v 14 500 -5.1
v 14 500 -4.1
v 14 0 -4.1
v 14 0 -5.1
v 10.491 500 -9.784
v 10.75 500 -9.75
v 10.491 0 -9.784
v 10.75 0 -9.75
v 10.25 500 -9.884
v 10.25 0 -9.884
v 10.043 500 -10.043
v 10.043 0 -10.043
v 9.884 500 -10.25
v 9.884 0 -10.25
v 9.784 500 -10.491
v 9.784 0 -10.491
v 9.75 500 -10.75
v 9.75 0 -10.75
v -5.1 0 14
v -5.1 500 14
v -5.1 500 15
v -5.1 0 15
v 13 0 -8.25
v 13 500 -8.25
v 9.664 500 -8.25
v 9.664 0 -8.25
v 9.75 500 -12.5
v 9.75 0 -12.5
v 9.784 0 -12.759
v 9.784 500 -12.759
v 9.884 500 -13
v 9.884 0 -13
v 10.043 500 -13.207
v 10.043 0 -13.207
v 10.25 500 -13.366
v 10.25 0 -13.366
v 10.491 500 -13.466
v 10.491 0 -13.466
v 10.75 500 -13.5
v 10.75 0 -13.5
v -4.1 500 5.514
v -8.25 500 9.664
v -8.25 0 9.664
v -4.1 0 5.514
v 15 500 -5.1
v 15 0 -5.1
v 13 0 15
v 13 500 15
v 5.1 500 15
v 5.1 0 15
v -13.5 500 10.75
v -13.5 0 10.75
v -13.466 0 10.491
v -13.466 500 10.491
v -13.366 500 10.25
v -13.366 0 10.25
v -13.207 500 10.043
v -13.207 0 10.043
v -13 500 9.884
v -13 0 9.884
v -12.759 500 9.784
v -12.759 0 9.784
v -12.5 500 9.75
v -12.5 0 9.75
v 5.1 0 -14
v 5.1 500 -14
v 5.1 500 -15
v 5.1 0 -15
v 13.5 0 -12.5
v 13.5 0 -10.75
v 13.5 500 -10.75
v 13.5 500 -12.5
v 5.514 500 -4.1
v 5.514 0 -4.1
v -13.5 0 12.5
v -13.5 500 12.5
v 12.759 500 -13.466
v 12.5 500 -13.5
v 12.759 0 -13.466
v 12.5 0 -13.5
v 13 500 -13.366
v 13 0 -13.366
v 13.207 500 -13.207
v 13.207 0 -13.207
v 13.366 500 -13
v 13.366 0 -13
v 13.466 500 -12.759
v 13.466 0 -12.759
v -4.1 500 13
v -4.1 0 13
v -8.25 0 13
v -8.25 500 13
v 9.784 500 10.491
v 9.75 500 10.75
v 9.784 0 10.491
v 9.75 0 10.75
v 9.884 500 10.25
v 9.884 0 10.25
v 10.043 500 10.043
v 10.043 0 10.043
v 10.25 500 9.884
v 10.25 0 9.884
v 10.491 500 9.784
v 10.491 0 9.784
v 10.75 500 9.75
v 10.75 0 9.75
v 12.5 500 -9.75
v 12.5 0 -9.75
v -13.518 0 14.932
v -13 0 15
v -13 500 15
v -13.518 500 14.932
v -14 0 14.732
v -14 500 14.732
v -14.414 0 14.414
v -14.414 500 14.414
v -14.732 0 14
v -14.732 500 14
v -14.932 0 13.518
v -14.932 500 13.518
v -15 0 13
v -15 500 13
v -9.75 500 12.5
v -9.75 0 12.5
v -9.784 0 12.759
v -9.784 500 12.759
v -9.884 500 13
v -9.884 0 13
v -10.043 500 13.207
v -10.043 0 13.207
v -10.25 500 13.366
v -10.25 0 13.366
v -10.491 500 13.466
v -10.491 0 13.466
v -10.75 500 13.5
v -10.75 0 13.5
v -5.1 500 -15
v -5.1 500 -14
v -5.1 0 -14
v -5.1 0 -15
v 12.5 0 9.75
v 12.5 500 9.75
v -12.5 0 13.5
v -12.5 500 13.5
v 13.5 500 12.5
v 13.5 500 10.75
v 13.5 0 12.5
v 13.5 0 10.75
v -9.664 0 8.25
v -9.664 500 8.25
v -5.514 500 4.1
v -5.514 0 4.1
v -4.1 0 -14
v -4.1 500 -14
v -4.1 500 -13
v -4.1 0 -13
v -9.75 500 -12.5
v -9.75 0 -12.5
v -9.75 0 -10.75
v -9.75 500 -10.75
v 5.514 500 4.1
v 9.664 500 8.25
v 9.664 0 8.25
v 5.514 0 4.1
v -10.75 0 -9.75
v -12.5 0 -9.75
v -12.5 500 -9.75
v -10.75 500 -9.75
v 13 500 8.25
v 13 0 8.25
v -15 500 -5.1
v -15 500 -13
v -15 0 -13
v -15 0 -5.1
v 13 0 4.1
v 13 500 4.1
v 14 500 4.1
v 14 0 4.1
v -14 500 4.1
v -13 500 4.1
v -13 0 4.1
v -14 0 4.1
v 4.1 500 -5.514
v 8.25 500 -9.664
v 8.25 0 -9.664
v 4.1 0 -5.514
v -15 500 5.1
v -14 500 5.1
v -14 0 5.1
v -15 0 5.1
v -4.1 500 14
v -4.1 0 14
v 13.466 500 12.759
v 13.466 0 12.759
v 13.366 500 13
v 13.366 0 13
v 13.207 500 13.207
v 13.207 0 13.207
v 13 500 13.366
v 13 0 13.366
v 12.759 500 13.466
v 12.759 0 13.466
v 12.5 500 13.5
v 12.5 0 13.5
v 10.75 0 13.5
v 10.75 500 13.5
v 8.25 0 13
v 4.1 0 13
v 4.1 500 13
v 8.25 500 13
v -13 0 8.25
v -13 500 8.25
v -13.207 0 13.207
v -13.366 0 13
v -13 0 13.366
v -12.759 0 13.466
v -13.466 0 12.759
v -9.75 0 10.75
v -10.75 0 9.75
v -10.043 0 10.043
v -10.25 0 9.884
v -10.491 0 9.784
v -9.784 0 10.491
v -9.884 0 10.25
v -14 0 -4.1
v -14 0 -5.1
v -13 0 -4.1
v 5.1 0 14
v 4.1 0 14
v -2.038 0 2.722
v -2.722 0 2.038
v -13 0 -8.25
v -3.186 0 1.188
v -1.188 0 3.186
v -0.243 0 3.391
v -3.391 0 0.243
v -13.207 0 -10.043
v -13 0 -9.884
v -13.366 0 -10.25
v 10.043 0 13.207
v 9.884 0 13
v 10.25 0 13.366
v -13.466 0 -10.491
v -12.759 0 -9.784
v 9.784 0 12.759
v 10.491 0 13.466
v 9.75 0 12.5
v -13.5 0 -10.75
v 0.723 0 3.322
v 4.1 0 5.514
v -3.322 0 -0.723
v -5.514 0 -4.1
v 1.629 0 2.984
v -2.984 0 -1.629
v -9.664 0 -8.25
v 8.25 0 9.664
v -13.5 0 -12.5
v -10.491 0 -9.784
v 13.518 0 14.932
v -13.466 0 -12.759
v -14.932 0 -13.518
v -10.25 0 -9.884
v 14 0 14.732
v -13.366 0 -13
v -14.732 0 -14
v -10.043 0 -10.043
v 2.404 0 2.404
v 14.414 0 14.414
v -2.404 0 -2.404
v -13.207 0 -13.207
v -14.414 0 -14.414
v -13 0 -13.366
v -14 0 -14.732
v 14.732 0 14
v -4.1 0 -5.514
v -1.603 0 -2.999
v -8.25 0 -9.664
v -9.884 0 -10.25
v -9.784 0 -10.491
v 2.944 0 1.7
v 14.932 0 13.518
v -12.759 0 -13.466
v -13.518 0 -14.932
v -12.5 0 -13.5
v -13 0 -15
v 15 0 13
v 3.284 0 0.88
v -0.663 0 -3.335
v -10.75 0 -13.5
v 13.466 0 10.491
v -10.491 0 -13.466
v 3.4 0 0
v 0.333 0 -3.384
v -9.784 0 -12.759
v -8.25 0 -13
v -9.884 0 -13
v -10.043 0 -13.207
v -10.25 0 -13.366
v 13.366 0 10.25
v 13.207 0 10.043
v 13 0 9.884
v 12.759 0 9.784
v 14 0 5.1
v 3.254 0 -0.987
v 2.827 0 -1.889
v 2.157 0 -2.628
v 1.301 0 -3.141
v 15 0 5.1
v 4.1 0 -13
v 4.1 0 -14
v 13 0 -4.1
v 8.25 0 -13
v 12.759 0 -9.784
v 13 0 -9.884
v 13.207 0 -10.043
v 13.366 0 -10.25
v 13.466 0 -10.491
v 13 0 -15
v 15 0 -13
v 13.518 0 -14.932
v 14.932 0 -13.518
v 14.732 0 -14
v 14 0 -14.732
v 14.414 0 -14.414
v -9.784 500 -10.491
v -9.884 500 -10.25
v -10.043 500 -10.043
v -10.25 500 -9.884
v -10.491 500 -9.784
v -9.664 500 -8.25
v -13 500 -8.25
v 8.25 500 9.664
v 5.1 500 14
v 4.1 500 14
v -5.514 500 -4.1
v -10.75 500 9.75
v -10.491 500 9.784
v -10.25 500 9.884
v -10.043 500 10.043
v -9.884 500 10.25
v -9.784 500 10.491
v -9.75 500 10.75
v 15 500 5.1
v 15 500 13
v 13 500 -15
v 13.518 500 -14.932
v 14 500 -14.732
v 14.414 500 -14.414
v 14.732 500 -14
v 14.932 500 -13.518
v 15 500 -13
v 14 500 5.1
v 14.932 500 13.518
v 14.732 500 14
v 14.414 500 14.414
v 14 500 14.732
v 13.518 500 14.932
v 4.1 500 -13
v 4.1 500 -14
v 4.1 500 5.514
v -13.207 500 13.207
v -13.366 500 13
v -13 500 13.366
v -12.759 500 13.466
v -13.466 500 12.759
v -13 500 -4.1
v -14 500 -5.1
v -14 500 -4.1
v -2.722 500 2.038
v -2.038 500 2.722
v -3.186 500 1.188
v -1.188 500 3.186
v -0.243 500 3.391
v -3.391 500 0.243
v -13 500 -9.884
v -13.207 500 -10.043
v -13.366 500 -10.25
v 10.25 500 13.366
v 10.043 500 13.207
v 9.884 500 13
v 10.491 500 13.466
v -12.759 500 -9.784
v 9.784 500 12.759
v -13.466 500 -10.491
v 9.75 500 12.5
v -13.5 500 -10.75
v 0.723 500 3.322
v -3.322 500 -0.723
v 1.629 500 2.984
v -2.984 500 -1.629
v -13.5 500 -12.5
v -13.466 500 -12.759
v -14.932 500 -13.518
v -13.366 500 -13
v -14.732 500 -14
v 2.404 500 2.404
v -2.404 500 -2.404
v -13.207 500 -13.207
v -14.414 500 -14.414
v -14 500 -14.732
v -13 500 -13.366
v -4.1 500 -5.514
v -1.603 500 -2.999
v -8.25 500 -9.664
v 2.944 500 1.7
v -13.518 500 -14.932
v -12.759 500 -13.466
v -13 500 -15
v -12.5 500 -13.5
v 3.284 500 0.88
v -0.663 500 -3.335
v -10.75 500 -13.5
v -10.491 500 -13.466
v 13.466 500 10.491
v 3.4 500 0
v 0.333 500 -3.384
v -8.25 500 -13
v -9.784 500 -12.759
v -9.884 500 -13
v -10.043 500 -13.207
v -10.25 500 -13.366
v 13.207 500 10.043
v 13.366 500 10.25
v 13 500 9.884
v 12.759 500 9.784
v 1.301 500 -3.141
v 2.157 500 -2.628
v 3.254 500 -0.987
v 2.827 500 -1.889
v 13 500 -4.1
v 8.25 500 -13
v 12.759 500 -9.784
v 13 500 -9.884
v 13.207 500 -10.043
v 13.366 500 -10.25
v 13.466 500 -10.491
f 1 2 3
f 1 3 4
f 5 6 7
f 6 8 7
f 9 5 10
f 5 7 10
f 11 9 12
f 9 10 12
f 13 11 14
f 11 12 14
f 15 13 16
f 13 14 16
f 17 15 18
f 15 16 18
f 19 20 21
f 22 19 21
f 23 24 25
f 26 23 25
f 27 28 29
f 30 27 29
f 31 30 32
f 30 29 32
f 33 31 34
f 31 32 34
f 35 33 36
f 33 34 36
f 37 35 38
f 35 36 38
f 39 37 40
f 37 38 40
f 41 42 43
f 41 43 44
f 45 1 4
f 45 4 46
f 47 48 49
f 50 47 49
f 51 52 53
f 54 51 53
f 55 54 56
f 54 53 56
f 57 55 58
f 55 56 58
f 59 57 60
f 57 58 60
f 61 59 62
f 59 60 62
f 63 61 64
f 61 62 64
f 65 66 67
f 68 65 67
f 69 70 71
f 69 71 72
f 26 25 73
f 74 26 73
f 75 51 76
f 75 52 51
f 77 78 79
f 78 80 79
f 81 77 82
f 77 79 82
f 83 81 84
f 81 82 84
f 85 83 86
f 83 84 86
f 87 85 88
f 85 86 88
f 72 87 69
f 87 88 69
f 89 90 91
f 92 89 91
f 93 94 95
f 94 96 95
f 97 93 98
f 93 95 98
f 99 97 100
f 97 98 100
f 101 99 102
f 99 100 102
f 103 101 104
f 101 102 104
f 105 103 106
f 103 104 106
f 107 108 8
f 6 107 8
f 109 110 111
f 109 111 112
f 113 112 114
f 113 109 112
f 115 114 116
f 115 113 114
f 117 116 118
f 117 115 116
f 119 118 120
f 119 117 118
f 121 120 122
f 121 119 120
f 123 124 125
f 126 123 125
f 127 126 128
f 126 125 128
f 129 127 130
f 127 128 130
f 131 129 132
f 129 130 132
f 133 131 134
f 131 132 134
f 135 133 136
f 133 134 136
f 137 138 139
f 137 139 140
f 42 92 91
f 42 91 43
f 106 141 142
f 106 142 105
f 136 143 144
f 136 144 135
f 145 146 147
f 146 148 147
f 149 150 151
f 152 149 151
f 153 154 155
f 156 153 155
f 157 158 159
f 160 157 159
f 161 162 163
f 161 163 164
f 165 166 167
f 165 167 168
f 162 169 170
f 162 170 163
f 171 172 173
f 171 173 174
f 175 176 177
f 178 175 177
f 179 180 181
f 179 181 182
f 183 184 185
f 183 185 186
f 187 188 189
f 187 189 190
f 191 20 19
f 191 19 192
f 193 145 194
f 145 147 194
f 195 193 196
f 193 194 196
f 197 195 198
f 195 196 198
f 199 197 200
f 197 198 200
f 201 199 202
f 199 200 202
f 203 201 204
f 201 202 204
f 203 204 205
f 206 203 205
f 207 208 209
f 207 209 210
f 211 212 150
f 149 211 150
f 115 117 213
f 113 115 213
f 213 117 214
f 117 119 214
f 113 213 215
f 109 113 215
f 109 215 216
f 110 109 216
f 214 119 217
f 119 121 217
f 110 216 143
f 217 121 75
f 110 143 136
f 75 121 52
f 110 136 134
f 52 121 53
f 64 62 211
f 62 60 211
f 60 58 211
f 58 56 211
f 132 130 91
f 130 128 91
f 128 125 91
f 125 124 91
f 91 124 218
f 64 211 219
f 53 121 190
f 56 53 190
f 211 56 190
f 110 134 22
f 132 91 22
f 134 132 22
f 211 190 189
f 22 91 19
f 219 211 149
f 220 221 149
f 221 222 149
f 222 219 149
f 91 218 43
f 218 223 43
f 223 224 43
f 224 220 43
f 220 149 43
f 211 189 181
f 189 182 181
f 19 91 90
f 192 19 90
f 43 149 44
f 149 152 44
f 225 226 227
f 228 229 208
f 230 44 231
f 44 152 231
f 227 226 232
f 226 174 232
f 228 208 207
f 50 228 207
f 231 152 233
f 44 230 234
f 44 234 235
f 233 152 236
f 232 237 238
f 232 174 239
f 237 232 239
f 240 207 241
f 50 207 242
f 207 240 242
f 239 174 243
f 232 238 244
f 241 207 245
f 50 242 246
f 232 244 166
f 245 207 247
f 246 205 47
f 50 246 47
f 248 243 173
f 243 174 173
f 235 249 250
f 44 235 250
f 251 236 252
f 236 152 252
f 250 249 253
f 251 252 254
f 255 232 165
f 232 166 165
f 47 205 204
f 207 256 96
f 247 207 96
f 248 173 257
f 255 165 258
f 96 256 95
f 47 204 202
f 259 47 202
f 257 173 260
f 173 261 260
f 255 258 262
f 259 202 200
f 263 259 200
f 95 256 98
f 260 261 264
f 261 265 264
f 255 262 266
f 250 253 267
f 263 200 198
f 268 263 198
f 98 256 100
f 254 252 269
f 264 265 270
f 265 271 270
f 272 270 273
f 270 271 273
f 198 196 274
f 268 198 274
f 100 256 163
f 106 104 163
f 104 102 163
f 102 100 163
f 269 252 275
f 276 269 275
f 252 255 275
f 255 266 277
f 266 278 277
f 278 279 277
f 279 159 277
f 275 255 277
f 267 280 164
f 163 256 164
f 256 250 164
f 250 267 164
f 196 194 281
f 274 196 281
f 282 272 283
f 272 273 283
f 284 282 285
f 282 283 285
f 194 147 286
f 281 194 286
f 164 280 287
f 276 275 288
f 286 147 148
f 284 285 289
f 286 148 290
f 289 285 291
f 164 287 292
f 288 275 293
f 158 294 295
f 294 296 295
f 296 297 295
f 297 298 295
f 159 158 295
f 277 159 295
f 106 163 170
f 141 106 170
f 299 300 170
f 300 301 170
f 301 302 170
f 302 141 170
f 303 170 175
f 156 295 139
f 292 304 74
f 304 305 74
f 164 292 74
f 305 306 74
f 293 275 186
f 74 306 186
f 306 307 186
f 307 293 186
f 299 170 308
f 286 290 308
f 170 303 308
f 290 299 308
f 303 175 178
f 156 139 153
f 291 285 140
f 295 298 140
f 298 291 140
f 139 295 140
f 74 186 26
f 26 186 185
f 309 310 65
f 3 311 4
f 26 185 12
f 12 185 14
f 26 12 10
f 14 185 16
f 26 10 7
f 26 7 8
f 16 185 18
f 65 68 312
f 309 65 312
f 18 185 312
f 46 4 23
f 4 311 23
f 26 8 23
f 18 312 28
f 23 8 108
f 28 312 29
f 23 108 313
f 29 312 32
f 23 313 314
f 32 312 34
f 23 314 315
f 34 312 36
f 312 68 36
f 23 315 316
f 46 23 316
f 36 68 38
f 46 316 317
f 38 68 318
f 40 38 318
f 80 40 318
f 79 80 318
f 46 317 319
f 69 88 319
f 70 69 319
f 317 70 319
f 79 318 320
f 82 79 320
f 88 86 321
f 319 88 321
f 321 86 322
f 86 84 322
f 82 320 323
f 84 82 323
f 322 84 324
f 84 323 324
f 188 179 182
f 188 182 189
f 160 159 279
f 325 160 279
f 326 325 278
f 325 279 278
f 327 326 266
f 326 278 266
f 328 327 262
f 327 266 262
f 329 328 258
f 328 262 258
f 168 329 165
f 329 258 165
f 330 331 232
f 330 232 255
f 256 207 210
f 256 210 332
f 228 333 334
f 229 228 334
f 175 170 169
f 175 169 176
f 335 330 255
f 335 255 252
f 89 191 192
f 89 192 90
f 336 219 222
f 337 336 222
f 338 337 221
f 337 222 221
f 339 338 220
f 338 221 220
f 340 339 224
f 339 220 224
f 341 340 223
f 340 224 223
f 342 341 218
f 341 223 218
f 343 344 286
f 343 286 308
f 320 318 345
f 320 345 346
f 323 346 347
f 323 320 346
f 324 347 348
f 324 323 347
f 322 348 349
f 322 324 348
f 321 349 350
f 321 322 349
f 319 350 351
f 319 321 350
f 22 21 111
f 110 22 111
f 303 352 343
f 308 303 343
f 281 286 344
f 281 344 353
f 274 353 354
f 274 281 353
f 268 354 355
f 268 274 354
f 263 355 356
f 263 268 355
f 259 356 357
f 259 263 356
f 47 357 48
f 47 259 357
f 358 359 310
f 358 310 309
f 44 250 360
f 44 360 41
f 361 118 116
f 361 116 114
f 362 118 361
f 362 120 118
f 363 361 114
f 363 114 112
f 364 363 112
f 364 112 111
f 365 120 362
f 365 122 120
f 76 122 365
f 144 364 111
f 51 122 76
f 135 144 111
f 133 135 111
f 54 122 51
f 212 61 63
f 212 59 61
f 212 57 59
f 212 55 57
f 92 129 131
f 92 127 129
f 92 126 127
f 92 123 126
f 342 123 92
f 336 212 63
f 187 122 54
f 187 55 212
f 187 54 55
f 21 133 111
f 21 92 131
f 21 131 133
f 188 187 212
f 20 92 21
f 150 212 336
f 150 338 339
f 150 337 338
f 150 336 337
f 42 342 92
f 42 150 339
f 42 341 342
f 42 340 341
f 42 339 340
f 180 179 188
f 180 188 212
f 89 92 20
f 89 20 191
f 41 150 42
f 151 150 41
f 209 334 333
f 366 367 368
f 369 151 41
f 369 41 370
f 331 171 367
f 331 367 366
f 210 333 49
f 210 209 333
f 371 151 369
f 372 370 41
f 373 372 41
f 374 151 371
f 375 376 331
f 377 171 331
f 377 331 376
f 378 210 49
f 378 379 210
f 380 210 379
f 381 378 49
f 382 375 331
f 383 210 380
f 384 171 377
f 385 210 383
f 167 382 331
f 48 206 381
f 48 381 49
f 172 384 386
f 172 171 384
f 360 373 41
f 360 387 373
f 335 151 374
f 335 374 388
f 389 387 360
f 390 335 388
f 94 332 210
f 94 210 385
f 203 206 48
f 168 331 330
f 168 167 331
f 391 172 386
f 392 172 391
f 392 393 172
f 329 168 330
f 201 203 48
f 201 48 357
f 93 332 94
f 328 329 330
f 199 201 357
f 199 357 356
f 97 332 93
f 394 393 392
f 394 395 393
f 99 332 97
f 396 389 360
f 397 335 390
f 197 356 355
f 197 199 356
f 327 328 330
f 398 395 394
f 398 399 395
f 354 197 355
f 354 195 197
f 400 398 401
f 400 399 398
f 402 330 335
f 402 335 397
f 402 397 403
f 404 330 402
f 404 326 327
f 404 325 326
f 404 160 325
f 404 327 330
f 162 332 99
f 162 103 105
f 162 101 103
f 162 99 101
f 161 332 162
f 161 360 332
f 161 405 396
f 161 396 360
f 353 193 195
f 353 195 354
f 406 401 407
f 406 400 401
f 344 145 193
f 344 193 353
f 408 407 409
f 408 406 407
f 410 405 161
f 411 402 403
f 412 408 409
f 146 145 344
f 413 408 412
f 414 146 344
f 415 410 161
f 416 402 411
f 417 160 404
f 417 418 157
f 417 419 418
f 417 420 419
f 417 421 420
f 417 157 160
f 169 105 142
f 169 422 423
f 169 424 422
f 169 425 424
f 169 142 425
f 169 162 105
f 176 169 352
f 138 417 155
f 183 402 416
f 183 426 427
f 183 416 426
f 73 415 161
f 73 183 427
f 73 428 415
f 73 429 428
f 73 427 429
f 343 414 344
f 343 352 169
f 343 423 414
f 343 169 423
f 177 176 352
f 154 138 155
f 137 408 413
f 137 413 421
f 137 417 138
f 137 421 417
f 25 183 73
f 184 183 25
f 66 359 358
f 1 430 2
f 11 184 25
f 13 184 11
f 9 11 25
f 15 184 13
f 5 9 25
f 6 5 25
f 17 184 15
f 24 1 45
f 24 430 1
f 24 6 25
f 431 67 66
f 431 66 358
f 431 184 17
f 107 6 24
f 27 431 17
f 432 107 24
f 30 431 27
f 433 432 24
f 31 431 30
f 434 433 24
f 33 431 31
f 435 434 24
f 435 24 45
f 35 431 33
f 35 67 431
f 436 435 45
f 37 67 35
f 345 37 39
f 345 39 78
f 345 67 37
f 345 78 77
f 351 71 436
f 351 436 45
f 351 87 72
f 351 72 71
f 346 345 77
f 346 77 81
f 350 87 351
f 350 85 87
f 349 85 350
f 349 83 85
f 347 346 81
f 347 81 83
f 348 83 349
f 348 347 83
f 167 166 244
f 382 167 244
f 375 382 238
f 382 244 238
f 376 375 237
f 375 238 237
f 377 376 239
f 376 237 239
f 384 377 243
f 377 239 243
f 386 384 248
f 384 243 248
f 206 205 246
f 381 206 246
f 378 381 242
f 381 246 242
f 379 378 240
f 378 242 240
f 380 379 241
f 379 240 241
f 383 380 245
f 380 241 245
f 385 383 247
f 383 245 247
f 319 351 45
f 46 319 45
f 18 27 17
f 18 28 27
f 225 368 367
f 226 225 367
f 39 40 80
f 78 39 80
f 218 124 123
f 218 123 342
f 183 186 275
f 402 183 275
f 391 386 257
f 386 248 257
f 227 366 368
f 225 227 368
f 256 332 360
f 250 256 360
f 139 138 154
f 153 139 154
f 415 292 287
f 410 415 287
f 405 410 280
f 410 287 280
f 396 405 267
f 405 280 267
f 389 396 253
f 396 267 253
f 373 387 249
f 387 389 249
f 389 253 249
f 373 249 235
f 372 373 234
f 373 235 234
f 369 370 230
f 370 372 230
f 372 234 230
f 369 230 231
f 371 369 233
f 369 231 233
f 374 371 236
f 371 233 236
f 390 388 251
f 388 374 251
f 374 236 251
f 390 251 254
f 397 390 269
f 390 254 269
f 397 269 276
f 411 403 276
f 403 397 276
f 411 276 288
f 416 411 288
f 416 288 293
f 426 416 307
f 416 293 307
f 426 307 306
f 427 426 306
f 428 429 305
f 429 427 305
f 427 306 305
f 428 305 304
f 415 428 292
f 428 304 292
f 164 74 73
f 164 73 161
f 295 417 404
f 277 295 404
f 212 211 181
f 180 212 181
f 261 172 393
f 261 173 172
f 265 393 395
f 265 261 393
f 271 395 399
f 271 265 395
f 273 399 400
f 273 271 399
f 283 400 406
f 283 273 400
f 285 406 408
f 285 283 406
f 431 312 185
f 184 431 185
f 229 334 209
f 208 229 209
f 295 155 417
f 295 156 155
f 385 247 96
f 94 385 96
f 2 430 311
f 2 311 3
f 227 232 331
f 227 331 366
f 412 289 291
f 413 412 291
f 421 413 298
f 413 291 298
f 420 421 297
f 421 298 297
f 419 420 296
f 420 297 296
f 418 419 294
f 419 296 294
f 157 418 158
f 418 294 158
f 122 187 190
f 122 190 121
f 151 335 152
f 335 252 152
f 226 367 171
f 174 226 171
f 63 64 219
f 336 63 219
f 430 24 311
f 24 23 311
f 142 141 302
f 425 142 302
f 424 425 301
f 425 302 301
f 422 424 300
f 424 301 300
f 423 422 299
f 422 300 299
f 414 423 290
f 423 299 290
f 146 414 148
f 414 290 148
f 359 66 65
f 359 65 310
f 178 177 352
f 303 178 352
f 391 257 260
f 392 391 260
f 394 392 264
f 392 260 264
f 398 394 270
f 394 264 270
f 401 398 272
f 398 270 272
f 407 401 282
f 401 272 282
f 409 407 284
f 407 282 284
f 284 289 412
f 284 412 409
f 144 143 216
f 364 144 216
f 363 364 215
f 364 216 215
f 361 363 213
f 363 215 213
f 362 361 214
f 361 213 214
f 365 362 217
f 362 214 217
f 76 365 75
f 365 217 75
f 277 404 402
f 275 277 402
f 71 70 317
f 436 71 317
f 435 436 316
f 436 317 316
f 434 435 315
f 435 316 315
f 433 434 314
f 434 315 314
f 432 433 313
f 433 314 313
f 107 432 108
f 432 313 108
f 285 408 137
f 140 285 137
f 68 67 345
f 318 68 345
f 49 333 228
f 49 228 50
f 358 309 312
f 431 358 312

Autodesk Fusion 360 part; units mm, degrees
sketch "Sketch1" plane through (0, 0, 0) normal (0, 1, 0) x (1, 0, 0)
  line L0 (-13, 4.1) -> (-14, 4.1)
  line L1 (-12.5, 9.75) -> (-10.75, 9.75)
  line L2 (-13, 15) -> (-5.1, 15)
  line L3 (-10.75, 9.75) -> (-12.5, 9.75)
  line L4 (-8.25, 13) -> (-8.25, 9.6642)
  line L5 (-5.1, 15) -> (-13, 15)
  line L6 (-4.1, 13) -> (-8.25, 13)
  line L7 (-8.25, 9.6642) -> (-4.1, 5.5142)
  line L8 (-5.1, 14) -> (-4.1, 14)
  line L9 (-13, 8.25) -> (-9.6642, 8.25)
  line L10 (-8.25, 10.6606) -> (-8.25, 13)
  arc A0 (-13, 15) -> (-15, 13) centre (-13, 13) ccw
  line L11 (-9.75, 12.5) -> (-9.75, 10.75)
  arc A1 (-13.5, 10.75) -> (-12.5, 9.75) centre (-12.5, 10.75) ccw
  line L12 (-10.75, 13.5) -> (-12.5, 13.5)
  line L13 (-15, 13) -> (-15, 5.1)
  line L14 (-12.5, 13.5) -> (-10.75, 13.5)
  line L15 (-9.6642, 8.25) -> (-5.5142, 4.1)
  line L16 (-13, 8.25) -> (-13, 4.1)
  line L17 (-5.1, 14) -> (-5.1, 15)
  line L18 (13, -4.1) -> (14, -4.1)
  arc A2 (13.5, -10.75) -> (12.5, -9.75) centre (12.5, -10.75) ccw
  line L19 (8.25, -10.6606) -> (8.25, -13)
  line L20 (12.5, -9.75) -> (10.75, -9.75)
  arc A3 (13, -15) -> (15, -13) centre (13, -13) ccw
  circle A4 centre (0, 0) radius 3.4
  line L21 (14, -4.1) -> (14, -5.1)
  line L22 (12.5, -12.5) -> (-13, 13)
  line L23 (4.1, -13) -> (8.25, -13)
  line L24 (13, -4.1) -> (14, -4.1)
  line L25 (9.5009, 9.5009) -> (1.6153, 1.6153) construction
  line L26 (5.1, -14) -> (5.1, -15)
  line L27 (12.5, -13.5) -> (10.75, -13.5)
  line L28 (14, -5.1) -> (15, -5.1)
  arc A5 (9.75, -12.5) -> (10.75, -13.5) centre (10.75, -12.5) ccw
  line L29 (10.75, -9.75) -> (12.5, -9.75)
  line L30 (4.1, 5.5142) -> (-4.1, 5.5142)
  line L31 (13, -15) -> (5.1, -15)
  line L32 (15, -13) -> (15, -5.1)
  line L33 (8.25, -13) -> (8.25, -9.6642)
  line L34 (4.1, -5.5142) -> (-4.1, -5.5142)
  line L35 (13.5, -10.75) -> (13.5, -12.5)
  line L36 (4.1, -14) -> (4.1, -13)
  line L37 (5.1, -14) -> (4.1, -14)
  line L38 (5.1, -15) -> (13, -15)
  line L39 (5.5142, 4.1) -> (5.5142, -4.1)
  line L40 (9.6642, -8.25) -> (5.5142, -4.1)
  line L41 (15, -5.1) -> (15, -13)
  line L42 (9.75, -12.5) -> (9.75, -10.75)
  arc A6 (12.5, -13.5) -> (13.5, -12.5) centre (12.5, -12.5) ccw
  arc A7 (12.5, -13.5) -> (13.5, -12.5) centre (12.5, -12.5) ccw
  line L43 (13, -8.25) -> (13, -4.1)
  line L44 (8.25, 10.6606) -> (8.25, 13)
  line L45 (8.25, 13) -> (8.25, 9.6642)
  line L46 (-5.5142, 4.1) -> (-5.5142, -4.1)
  line L47 (-9.5009, -9.5009) -> (-1.6152, -1.6153) construction
  line L48 (5.1, 15) -> (13, 15)
  line L49 (13, 15) -> (5.1, 15)
  arc A8 (13.5, 12.5) -> (12.5, 13.5) centre (12.5, 12.5) ccw
  line L50 (-15, -5.1) -> (-15, -13)
  line L51 (5.1, 14) -> (4.1, 14)
  arc A9 (-10.75, 9.75) -> (-9.75, 10.75) centre (-10.75, 10.75) ccw
  line L52 (-13, 4.1) -> (-14, 4.1)
  line L53 (-9.5009, 9.5009) -> (-1.6152, 1.6153) construction
  line L54 (-14, 4.1) -> (-14, 5.1)
  line L55 (-4.1, 14) -> (-4.1, 13)
  arc A10 (-12.5, 13.5) -> (-13.5, 12.5) centre (-12.5, 12.5) ccw
  line L56 (-15, 5.1) -> (-15, 13)
  arc A11 (-9.75, 12.5) -> (-10.75, 13.5) centre (-10.75, 12.5) ccw
  line L57 (-14, 5.1) -> (-15, 5.1)
  arc A12 (-12.5, 13.5) -> (-13.5, 12.5) centre (-12.5, 12.5) ccw
  line L58 (-13.5, 10.75) -> (-13.5, 12.5)
  line L59 (-8.25, -13) -> (-8.25, -9.6642)
  line L60 (-9.6642, -8.25) -> (-5.5142, -4.1)
  line L61 (-4.1, -13) -> (-8.25, -13)
  arc A13 (-13.5, -12.5) -> (-12.5, -13.5) centre (-12.5, -12.5) ccw
  line L62 (-15, -13) -> (-15, -5.1)
  line L63 (-14, -4.1) -> (-14, -5.1)
  line L64 (-13, -8.25) -> (-9.6642, -8.25)
  line L65 (-13, -8.25) -> (-13, -4.1)
  line L66 (-5.1, -14) -> (-4.1, -14)
  line L67 (-12.5, -9.75) -> (-10.75, -9.75)
  line L68 (-8.25, -10.6606) -> (-8.25, -13)
  arc A14 (-9.75, -10.75) -> (-10.75, -9.75) centre (-10.75, -10.75) ccw
  arc A15 (-13.5, -12.5) -> (-12.5, -13.5) centre (-12.5, -12.5) ccw
  arc A16 (-15, -13) -> (-13, -15) centre (-13, -13) ccw
  line L69 (-5.1, -15) -> (-13, -15)
  line L70 (9.6642, 8.25) -> (5.5142, 4.1)
  line L71 (13.5, 10.75) -> (13.5, 12.5)
  line L72 (14, 5.1) -> (15, 5.1)
  arc A17 (13.5, 12.5) -> (12.5, 13.5) centre (12.5, 12.5) ccw
  line L73 (13, 4.1) -> (14, 4.1)
  line L74 (4.1, 14) -> (4.1, 13)
  line L75 (12.5, 9.75) -> (10.75, 9.75)
  line L76 (10.75, 13.5) -> (12.5, 13.5)
  line L77 (13, 4.1) -> (14, 4.1)
  arc A18 (9.75, 10.75) -> (10.75, 9.75) centre (10.75, 10.75) ccw
  line L78 (5.1, 14) -> (5.1, 15)
  line L79 (15, 13) -> (15, 5.1)
  arc A19 (15, 13) -> (13, 15) centre (13, 13) ccw
  arc A20 (10.75, -9.75) -> (9.75, -10.75) centre (10.75, -10.75) ccw
  line L80 (8.25, -9.6642) -> (4.1, -5.5142)
  line L81 (14, 4.1) -> (14, 5.1)
  line L82 (13, 8.25) -> (9.6642, 8.25)
  line L83 (13, -8.25) -> (9.6642, -8.25)
  line L84 (9.5009, -9.5009) -> (1.6153, -1.6153) construction
  line L85 (10.75, 9.75) -> (12.5, 9.75)
  line L86 (8.25, 9.6642) -> (4.1, 5.5142)
  line L87 (15, 5.1) -> (15, 13)
  line L88 (13, 8.25) -> (13, 4.1)
  line L89 (12.5, 13.5) -> (10.75, 13.5)
  arc A21 (10.75, 13.5) -> (9.75, 12.5) centre (10.75, 12.5) ccw
  line L90 (10.75, -13.5) -> (12.5, -13.5)
  line L91 (4.1, 13) -> (8.25, 13)
  line L92 (9.75, 12.5) -> (9.75, 10.75)
  arc A22 (12.5, 9.75) -> (13.5, 10.75) centre (12.5, 10.75) ccw
  line L93 (-14, -5.1) -> (-15, -5.1)
  line L94 (-13, -15) -> (-5.1, -15)
  line L95 (-4.1, -14) -> (-4.1, -13)
  arc A23 (-12.5, -9.75) -> (-13.5, -10.75) centre (-12.5, -10.75) ccw
  line L96 (-10.75, -9.75) -> (-12.5, -9.75)
  line L97 (-12.5, -13.5) -> (-10.75, -13.5)
  line L98 (-8.25, -9.6642) -> (-4.1, -5.5142)
  line L99 (-13.5, -10.75) -> (-13.5, -12.5)
  arc A24 (-10.75, -13.5) -> (-9.75, -12.5) centre (-10.75, -12.5) ccw
  line L100 (-5.1, -14) -> (-5.1, -15)
  line L101 (-13, -4.1) -> (-14, -4.1)
  line L102 (-10.75, -13.5) -> (-12.5, -13.5)
  line L103 (-13, -4.1) -> (-14, -4.1)
  line L104 (-9.75, -12.5) -> (-9.75, -10.75)
  point P0 (-15, -15)
  point P1 (-14, -4.1)
  point P2 (-15, 0)
  point P3 (-5.1, -14)
  point P4 (-5.1, 14)
  point P5 (-12.5, -12.5)
  point P6 (-14, -5.1)
  point P7 (0, 0)
  point P8 (-15, -5.1)
  point P9 (-13, -8.25)
  point P10 (0, 0)
  point P11 (0, 15)
  point P12 (15, 15)
  point P13 (12.5, 12.5)
  point P14 (5.1, 15)
  point P15 (15, 0)
  point P16 (0, 0)
  point P17 (5.1, 14)
  point P18 (14, 4.1)
  point P19 (13, 8.25)
  point P20 (-12.5, 12.5)
  point P21 (8.25, 13)
  point P22 (-8.25, 13)
  point P23 (14, 5.1)
  point P24 (4.1, 14)
  point P25 (15, 5.1)
  point P26 (-15, 0)
  point P27 (-4.1, 13)
  point P28 (-5.1, 15)
  point P29 (4.1, 13)
  point P30 (-5.1, -15)
  point P31 (0, -15)
  point P32 (0, 0)
  point P33 (0, 15)
  point P34 (-4.1, 14)
  point P35 (-13, 8.25)
  point P36 (0, 0)
  point P37 (-4.1, -14)
  point P38 (0, 15)
  point P39 (-4.1, -13)
  point P40 (-14, 4.1)
  point P41 (-15, 5.1)
  point P42 (-14, 5.1)
  point P43 (0, 0)
  point P44 (-8.25, -13)
  point P45 (-15, 15)
  point P46 (5.1, -15)
  point P47 (15, -15)
  point P48 (4.1, -14)
  point P49 (15, -5.1)
  point P50 (13, -8.25)
  point P51 (4.1, -13)
  point P52 (14, -4.1)
  point P53 (5.1, -14)
  point P54 (8.25, -13)
  point P55 (14, -5.1)
  dimension "d1" = 2
  dimension "d2" = 1
  dimension "d3" = 1.5
  dimension "d4" = 1
  dimension "d5" = 1
  dimension "d6" = 1.5
  dimension "d7" = 1.5
  dimension "d8" = 1.5
  dimension "d9" = 8.2
  dimension "d10" = 8.2
  dimension "d11" = 6.8
extrude "Extrude1" add sketch "Sketch1" along normal blind 150

Autodesk Fusion 360 part; units mm, degrees
sketch "Sketch1" plane through (0, 0, 0) normal (0, 1, 0) x (1, 0, 0)
  line L0 (-13, 4.1) -> (-14, 4.1)
  line L1 (-12.5, 9.75) -> (-10.75, 9.75)
  line L2 (-13, 15) -> (-5.1, 15)
  line L3 (-10.75, 9.75) -> (-12.5, 9.75)
  line L4 (-8.25, 13) -> (-8.25, 9.6642)
  line L5 (-5.1, 15) -> (-13, 15)
  line L6 (-4.1, 13) -> (-8.25, 13)
  line L7 (-8.25, 9.6642) -> (-4.1, 5.5142)
  line L8 (-5.1, 14) -> (-4.1, 14)
  line L9 (-13, 8.25) -> (-9.6642, 8.25)
  line L10 (-8.25, 10.6606) -> (-8.25, 13)
  arc A0 (-13, 15) -> (-15, 13) centre (-13, 13) ccw
  line L11 (-9.75, 12.5) -> (-9.75, 10.75)
  arc A1 (-13.5, 10.75) -> (-12.5, 9.75) centre (-12.5, 10.75) ccw
  line L12 (-10.75, 13.5) -> (-12.5, 13.5)
  line L13 (-15, 13) -> (-15, 5.1)
  line L14 (-12.5, 13.5) -> (-10.75, 13.5)
  line L15 (-9.6642, 8.25) -> (-5.5142, 4.1)
  line L16 (-13, 8.25) -> (-13, 4.1)
  line L17 (-5.1, 14) -> (-5.1, 15)
  line L18 (13, -4.1) -> (14, -4.1)
  arc A2 (13.5, -10.75) -> (12.5, -9.75) centre (12.5, -10.75) ccw
  line L19 (8.25, -10.6606) -> (8.25, -13)
  line L20 (12.5, -9.75) -> (10.75, -9.75)
  arc A3 (13, -15) -> (15, -13) centre (13, -13) ccw
  circle A4 centre (0, 0) radius 3.4
  line L21 (14, -4.1) -> (14, -5.1)
  line L22 (12.5, -12.5) -> (-13, 13)
  line L23 (4.1, -13) -> (8.25, -13)
  line L24 (13, -4.1) -> (14, -4.1)
  line L25 (9.5009, 9.5009) -> (1.6153, 1.6153) construction
  line L26 (5.1, -14) -> (5.1, -15)
  line L27 (12.5, -13.5) -> (10.75, -13.5)
  line L28 (14, -5.1) -> (15, -5.1)
  arc A5 (9.75, -12.5) -> (10.75, -13.5) centre (10.75, -12.5) ccw
  line L29 (10.75, -9.75) -> (12.5, -9.75)
  line L30 (4.1, 5.5142) -> (-4.1, 5.5142)
  line L31 (13, -15) -> (5.1, -15)
  line L32 (15, -13) -> (15, -5.1)
  line L33 (8.25, -13) -> (8.25, -9.6642)
  line L34 (4.1, -5.5142) -> (-4.1, -5.5142)
  line L35 (13.5, -10.75) -> (13.5, -12.5)
  line L36 (4.1, -14) -> (4.1, -13)
  line L37 (5.1, -14) -> (4.1, -14)
  line L38 (5.1, -15) -> (13, -15)
  line L39 (5.5142, 4.1) -> (5.5142, -4.1)
  line L40 (9.6642, -8.25) -> (5.5142, -4.1)
  line L41 (15, -5.1) -> (15, -13)
  line L42 (9.75, -12.5) -> (9.75, -10.75)
  arc A6 (12.5, -13.5) -> (13.5, -12.5) centre (12.5, -12.5) ccw
  arc A7 (12.5, -13.5) -> (13.5, -12.5) centre (12.5, -12.5) ccw
  line L43 (13, -8.25) -> (13, -4.1)
  line L44 (8.25, 10.6606) -> (8.25, 13)
  line L45 (8.25, 13) -> (8.25, 9.6642)
  line L46 (-5.5142, 4.1) -> (-5.5142, -4.1)
  line L47 (-9.5009, -9.5009) -> (-1.6152, -1.6153) construction
  line L48 (5.1, 15) -> (13, 15)
  line L49 (13, 15) -> (5.1, 15)
  arc A8 (13.5, 12.5) -> (12.5, 13.5) centre (12.5, 12.5) ccw
  line L50 (-15, -5.1) -> (-15, -13)
  line L51 (5.1, 14) -> (4.1, 14)
  arc A9 (-10.75, 9.75) -> (-9.75, 10.75) centre (-10.75, 10.75) ccw
  line L52 (-13, 4.1) -> (-14, 4.1)
  line L53 (-9.5009, 9.5009) -> (-1.6152, 1.6153) construction
  line L54 (-14, 4.1) -> (-14, 5.1)
  line L55 (-4.1, 14) -> (-4.1, 13)
  arc A10 (-12.5, 13.5) -> (-13.5, 12.5) centre (-12.5, 12.5) ccw
  line L56 (-15, 5.1) -> (-15, 13)
  arc A11 (-9.75, 12.5) -> (-10.75, 13.5) centre (-10.75, 12.5) ccw
  line L57 (-14, 5.1) -> (-15, 5.1)
  arc A12 (-12.5, 13.5) -> (-13.5, 12.5) centre (-12.5, 12.5) ccw
  line L58 (-13.5, 10.75) -> (-13.5, 12.5)
  line L59 (-8.25, -13) -> (-8.25, -9.6642)
  line L60 (-9.6642, -8.25) -> (-5.5142, -4.1)
  line L61 (-4.1, -13) -> (-8.25, -13)
  arc A13 (-13.5, -12.5) -> (-12.5, -13.5) centre (-12.5, -12.5) ccw
  line L62 (-15, -13) -> (-15, -5.1)
  line L63 (-14, -4.1) -> (-14, -5.1)
  line L64 (-13, -8.25) -> (-9.6642, -8.25)
  line L65 (-13, -8.25) -> (-13, -4.1)
  line L66 (-5.1, -14) -> (-4.1, -14)
  line L67 (-12.5, -9.75) -> (-10.75, -9.75)
  line L68 (-8.25, -10.6606) -> (-8.25, -13)
  arc A14 (-9.75, -10.75) -> (-10.75, -9.75) centre (-10.75, -10.75) ccw
  arc A15 (-13.5, -12.5) -> (-12.5, -13.5) centre (-12.5, -12.5) ccw
  arc A16 (-15, -13) -> (-13, -15) centre (-13, -13) ccw
  line L69 (-5.1, -15) -> (-13, -15)
  line L70 (9.6642, 8.25) -> (5.5142, 4.1)
  line L71 (13.5, 10.75) -> (13.5, 12.5)
  line L72 (14, 5.1) -> (15, 5.1)
  arc A17 (13.5, 12.5) -> (12.5, 13.5) centre (12.5, 12.5) ccw
  line L73 (13, 4.1) -> (14, 4.1)
  line L74 (4.1, 14) -> (4.1, 13)
  line L75 (12.5, 9.75) -> (10.75, 9.75)
  line L76 (10.75, 13.5) -> (12.5, 13.5)
  line L77 (13, 4.1) -> (14, 4.1)
  arc A18 (9.75, 10.75) -> (10.75, 9.75) centre (10.75, 10.75) ccw
  line L78 (5.1, 14) -> (5.1, 15)
  line L79 (15, 13) -> (15, 5.1)
  arc A19 (15, 13) -> (13, 15) centre (13, 13) ccw
  arc A20 (10.75, -9.75) -> (9.75, -10.75) centre (10.75, -10.75) ccw
  line L80 (8.25, -9.6642) -> (4.1, -5.5142)
  line L81 (14, 4.1) -> (14, 5.1)
  line L82 (13, 8.25) -> (9.6642, 8.25)
  line L83 (13, -8.25) -> (9.6642, -8.25)
  line L84 (9.5009, -9.5009) -> (1.6153, -1.6153) construction
  line L85 (10.75, 9.75) -> (12.5, 9.75)
  line L86 (8.25, 9.6642) -> (4.1, 5.5142)
  line L87 (15, 5.1) -> (15, 13)
  line L88 (13, 8.25) -> (13, 4.1)
  line L89 (12.5, 13.5) -> (10.75, 13.5)
  arc A21 (10.75, 13.5) -> (9.75, 12.5) centre (10.75, 12.5) ccw
  line L90 (10.75, -13.5) -> (12.5, -13.5)
  line L91 (4.1, 13) -> (8.25, 13)
  line L92 (9.75, 12.5) -> (9.75, 10.75)
  arc A22 (12.5, 9.75) -> (13.5, 10.75) centre (12.5, 10.75) ccw
  line L93 (-14, -5.1) -> (-15, -5.1)
  line L94 (-13, -15) -> (-5.1, -15)
  line L95 (-4.1, -14) -> (-4.1, -13)
  arc A23 (-12.5, -9.75) -> (-13.5, -10.75) centre (-12.5, -10.75) ccw
  line L96 (-10.75, -9.75) -> (-12.5, -9.75)
  line L97 (-12.5, -13.5) -> (-10.75, -13.5)
  line L98 (-8.25, -9.6642) -> (-4.1, -5.5142)
  line L99 (-13.5, -10.75) -> (-13.5, -12.5)
  arc A24 (-10.75, -13.5) -> (-9.75, -12.5) centre (-10.75, -12.5) ccw
  line L100 (-5.1, -14) -> (-5.1, -15)
  line L101 (-13, -4.1) -> (-14, -4.1)
  line L102 (-10.75, -13.5) -> (-12.5, -13.5)
  line L103 (-13, -4.1) -> (-14, -4.1)
  line L104 (-9.75, -12.5) -> (-9.75, -10.75)
  point P0 (-15, -15)
  point P1 (-14, -4.1)
  point P2 (-15, 0)
  point P3 (-5.1, -14)
  point P4 (-5.1, 14)
  point P5 (-12.5, -12.5)
  point P6 (-14, -5.1)
  point P7 (0, 0)
  point P8 (-15, -5.1)
  point P9 (-13, -8.25)
  point P10 (0, 0)
  point P11 (0, 15)
  point P12 (15, 15)
  point P13 (12.5, 12.5)
  point P14 (5.1, 15)
  point P15 (15, 0)
  point P16 (0, 0)
  point P17 (5.1, 14)
  point P18 (14, 4.1)
  point P19 (13, 8.25)
  point P20 (-12.5, 12.5)
  point P21 (8.25, 13)
  point P22 (-8.25, 13)
  point P23 (14, 5.1)
  point P24 (4.1, 14)
  point P25 (15, 5.1)
  point P26 (-15, 0)
  point P27 (-4.1, 13)
  point P28 (-5.1, 15)
  point P29 (4.1, 13)
  point P30 (-5.1, -15)
  point P31 (0, -15)
  point P32 (0, 0)
  point P33 (0, 15)
  point P34 (-4.1, 14)
  point P35 (-13, 8.25)
  point P36 (0, 0)
  point P37 (-4.1, -14)
  point P38 (0, 15)
  point P39 (-4.1, -13)
  point P40 (-14, 4.1)
  point P41 (-15, 5.1)
  point P42 (-14, 5.1)
  point P43 (0, 0)
  point P44 (-8.25, -13)
  point P45 (-15, 15)
  point P46 (5.1, -15)
  point P47 (15, -15)
  point P48 (4.1, -14)
  point P49 (15, -5.1)
  point P50 (13, -8.25)
  point P51 (4.1, -13)
  point P52 (14, -4.1)
  point P53 (5.1, -14)
  point P54 (8.25, -13)
  point P55 (14, -5.1)
  dimension "d1" = 2
  dimension "d2" = 1
  dimension "d3" = 1.5
  dimension "d4" = 1
  dimension "d5" = 1
  dimension "d6" = 1.5
  dimension "d7" = 1.5
  dimension "d8" = 1.5
  dimension "d9" = 8.2
  dimension "d10" = 8.2
  dimension "d11" = 6.8
extrude "Extrude1" add sketch "Sketch1" along normal blind 300

Autodesk Fusion 360 part; units mm, degrees
sketch "Sketch1" plane through (0, 0, 0) normal (0, 1, 0) x (1, 0, 0)
  line L0 (-13, 4.1) -> (-14, 4.1)
  line L1 (-12.5, 9.75) -> (-10.75, 9.75)
  line L2 (-13, 15) -> (-5.1, 15)
  line L3 (-10.75, 9.75) -> (-12.5, 9.75)
  line L4 (-8.25, 13) -> (-8.25, 9.6642)
  line L5 (-5.1, 15) -> (-13, 15)
  line L6 (-4.1, 13) -> (-8.25, 13)
  line L7 (-8.25, 9.6642) -> (-4.1, 5.5142)
  line L8 (-5.1, 14) -> (-4.1, 14)
  line L9 (-13, 8.25) -> (-9.6642, 8.25)
  line L10 (-8.25, 10.6606) -> (-8.25, 13)
  arc A0 (-13, 15) -> (-15, 13) centre (-13, 13) ccw
  line L11 (-9.75, 12.5) -> (-9.75, 10.75)
  arc A1 (-13.5, 10.75) -> (-12.5, 9.75) centre (-12.5, 10.75) ccw
  line L12 (-10.75, 13.5) -> (-12.5, 13.5)
  line L13 (-15, 13) -> (-15, 5.1)
  line L14 (-12.5, 13.5) -> (-10.75, 13.5)
  line L15 (-9.6642, 8.25) -> (-5.5142, 4.1)
  line L16 (-13, 8.25) -> (-13, 4.1)
  line L17 (-5.1, 14) -> (-5.1, 15)
  line L18 (13, -4.1) -> (14, -4.1)
  arc A2 (13.5, -10.75) -> (12.5, -9.75) centre (12.5, -10.75) ccw
  line L19 (8.25, -10.6606) -> (8.25, -13)
  line L20 (12.5, -9.75) -> (10.75, -9.75)
  arc A3 (13, -15) -> (15, -13) centre (13, -13) ccw
  circle A4 centre (0, 0) radius 3.4
  line L21 (14, -4.1) -> (14, -5.1)
  line L22 (12.5, -12.5) -> (-13, 13)
  line L23 (4.1, -13) -> (8.25, -13)
  line L24 (13, -4.1) -> (14, -4.1)
  line L25 (9.5009, 9.5009) -> (1.6153, 1.6153) construction
  line L26 (5.1, -14) -> (5.1, -15)
  line L27 (12.5, -13.5) -> (10.75, -13.5)
  line L28 (14, -5.1) -> (15, -5.1)
  arc A5 (9.75, -12.5) -> (10.75, -13.5) centre (10.75, -12.5) ccw
  line L29 (10.75, -9.75) -> (12.5, -9.75)
  line L30 (4.1, 5.5142) -> (-4.1, 5.5142)
  line L31 (13, -15) -> (5.1, -15)
  line L32 (15, -13) -> (15, -5.1)
  line L33 (8.25, -13) -> (8.25, -9.6642)
  line L34 (4.1, -5.5142) -> (-4.1, -5.5142)
  line L35 (13.5, -10.75) -> (13.5, -12.5)
  line L36 (4.1, -14) -> (4.1, -13)
  line L37 (5.1, -14) -> (4.1, -14)
  line L38 (5.1, -15) -> (13, -15)
  line L39 (5.5142, 4.1) -> (5.5142, -4.1)
  line L40 (9.6642, -8.25) -> (5.5142, -4.1)
  line L41 (15, -5.1) -> (15, -13)
  line L42 (9.75, -12.5) -> (9.75, -10.75)
  arc A6 (12.5, -13.5) -> (13.5, -12.5) centre (12.5, -12.5) ccw
  arc A7 (12.5, -13.5) -> (13.5, -12.5) centre (12.5, -12.5) ccw
  line L43 (13, -8.25) -> (13, -4.1)
  line L44 (8.25, 10.6606) -> (8.25, 13)
  line L45 (8.25, 13) -> (8.25, 9.6642)
  line L46 (-5.5142, 4.1) -> (-5.5142, -4.1)
  line L47 (-9.5009, -9.5009) -> (-1.6152, -1.6153) construction
  line L48 (5.1, 15) -> (13, 15)
  line L49 (13, 15) -> (5.1, 15)
  arc A8 (13.5, 12.5) -> (12.5, 13.5) centre (12.5, 12.5) ccw
  line L50 (-15, -5.1) -> (-15, -13)
  line L51 (5.1, 14) -> (4.1, 14)
  arc A9 (-10.75, 9.75) -> (-9.75, 10.75) centre (-10.75, 10.75) ccw
  line L52 (-13, 4.1) -> (-14, 4.1)
  line L53 (-9.5009, 9.5009) -> (-1.6152, 1.6153) construction
  line L54 (-14, 4.1) -> (-14, 5.1)
  line L55 (-4.1, 14) -> (-4.1, 13)
  arc A10 (-12.5, 13.5) -> (-13.5, 12.5) centre (-12.5, 12.5) ccw
  line L56 (-15, 5.1) -> (-15, 13)
  arc A11 (-9.75, 12.5) -> (-10.75, 13.5) centre (-10.75, 12.5) ccw
  line L57 (-14, 5.1) -> (-15, 5.1)
  arc A12 (-12.5, 13.5) -> (-13.5, 12.5) centre (-12.5, 12.5) ccw
  line L58 (-13.5, 10.75) -> (-13.5, 12.5)
  line L59 (-8.25, -13) -> (-8.25, -9.6642)
  line L60 (-9.6642, -8.25) -> (-5.5142, -4.1)
  line L61 (-4.1, -13) -> (-8.25, -13)
  arc A13 (-13.5, -12.5) -> (-12.5, -13.5) centre (-12.5, -12.5) ccw
  line L62 (-15, -13) -> (-15, -5.1)
  line L63 (-14, -4.1) -> (-14, -5.1)
  line L64 (-13, -8.25) -> (-9.6642, -8.25)
  line L65 (-13, -8.25) -> (-13, -4.1)
  line L66 (-5.1, -14) -> (-4.1, -14)
  line L67 (-12.5, -9.75) -> (-10.75, -9.75)
  line L68 (-8.25, -10.6606) -> (-8.25, -13)
  arc A14 (-9.75, -10.75) -> (-10.75, -9.75) centre (-10.75, -10.75) ccw
  arc A15 (-13.5, -12.5) -> (-12.5, -13.5) centre (-12.5, -12.5) ccw
  arc A16 (-15, -13) -> (-13, -15) centre (-13, -13) ccw
  line L69 (-5.1, -15) -> (-13, -15)
  line L70 (9.6642, 8.25) -> (5.5142, 4.1)
  line L71 (13.5, 10.75) -> (13.5, 12.5)
  line L72 (14, 5.1) -> (15, 5.1)
  arc A17 (13.5, 12.5) -> (12.5, 13.5) centre (12.5, 12.5) ccw
  line L73 (13, 4.1) -> (14, 4.1)
  line L74 (4.1, 14) -> (4.1, 13)
  line L75 (12.5, 9.75) -> (10.75, 9.75)
  line L76 (10.75, 13.5) -> (12.5, 13.5)
  line L77 (13, 4.1) -> (14, 4.1)
  arc A18 (9.75, 10.75) -> (10.75, 9.75) centre (10.75, 10.75) ccw
  line L78 (5.1, 14) -> (5.1, 15)
  line L79 (15, 13) -> (15, 5.1)
  arc A19 (15, 13) -> (13, 15) centre (13, 13) ccw
  arc A20 (10.75, -9.75) -> (9.75, -10.75) centre (10.75, -10.75) ccw
  line L80 (8.25, -9.6642) -> (4.1, -5.5142)
  line L81 (14, 4.1) -> (14, 5.1)
  line L82 (13, 8.25) -> (9.6642, 8.25)
  line L83 (13, -8.25) -> (9.6642, -8.25)
  line L84 (9.5009, -9.5009) -> (1.6153, -1.6153) construction
  line L85 (10.75, 9.75) -> (12.5, 9.75)
  line L86 (8.25, 9.6642) -> (4.1, 5.5142)
  line L87 (15, 5.1) -> (15, 13)
  line L88 (13, 8.25) -> (13, 4.1)
  line L89 (12.5, 13.5) -> (10.75, 13.5)
  arc A21 (10.75, 13.5) -> (9.75, 12.5) centre (10.75, 12.5) ccw
  line L90 (10.75, -13.5) -> (12.5, -13.5)
  line L91 (4.1, 13) -> (8.25, 13)
  line L92 (9.75, 12.5) -> (9.75, 10.75)
  arc A22 (12.5, 9.75) -> (13.5, 10.75) centre (12.5, 10.75) ccw
  line L93 (-14, -5.1) -> (-15, -5.1)
  line L94 (-13, -15) -> (-5.1, -15)
  line L95 (-4.1, -14) -> (-4.1, -13)
  arc A23 (-12.5, -9.75) -> (-13.5, -10.75) centre (-12.5, -10.75) ccw
  line L96 (-10.75, -9.75) -> (-12.5, -9.75)
  line L97 (-12.5, -13.5) -> (-10.75, -13.5)
  line L98 (-8.25, -9.6642) -> (-4.1, -5.5142)
  line L99 (-13.5, -10.75) -> (-13.5, -12.5)
  arc A24 (-10.75, -13.5) -> (-9.75, -12.5) centre (-10.75, -12.5) ccw
  line L100 (-5.1, -14) -> (-5.1, -15)
  line L101 (-13, -4.1) -> (-14, -4.1)
  line L102 (-10.75, -13.5) -> (-12.5, -13.5)
  line L103 (-13, -4.1) -> (-14, -4.1)
  line L104 (-9.75, -12.5) -> (-9.75, -10.75)
  point P0 (-15, -15)
  point P1 (-14, -4.1)
  point P2 (-15, 0)
  point P3 (-5.1, -14)
  point P4 (-5.1, 14)
  point P5 (-12.5, -12.5)
  point P6 (-14, -5.1)
  point P7 (0, 0)
  point P8 (-15, -5.1)
  point P9 (-13, -8.25)
  point P10 (0, 0)
  point P11 (0, 15)
  point P12 (15, 15)
  point P13 (12.5, 12.5)
  point P14 (5.1, 15)
  point P15 (15, 0)
  point P16 (0, 0)
  point P17 (5.1, 14)
  point P18 (14, 4.1)
  point P19 (13, 8.25)
  point P20 (-12.5, 12.5)
  point P21 (8.25, 13)
  point P22 (-8.25, 13)
  point P23 (14, 5.1)
  point P24 (4.1, 14)
  point P25 (15, 5.1)
  point P26 (-15, 0)
  point P27 (-4.1, 13)
  point P28 (-5.1, 15)
  point P29 (4.1, 13)
  point P30 (-5.1, -15)
  point P31 (0, -15)
  point P32 (0, 0)
  point P33 (0, 15)
  point P34 (-4.1, 14)
  point P35 (-13, 8.25)
  point P36 (0, 0)
  point P37 (-4.1, -14)
  point P38 (0, 15)
  point P39 (-4.1, -13)
  point P40 (-14, 4.1)
  point P41 (-15, 5.1)
  point P42 (-14, 5.1)
  point P43 (0, 0)
  point P44 (-8.25, -13)
  point P45 (-15, 15)
  point P46 (5.1, -15)
  point P47 (15, -15)
  point P48 (4.1, -14)
  point P49 (15, -5.1)
  point P50 (13, -8.25)
  point P51 (4.1, -13)
  point P52 (14, -4.1)
  point P53 (5.1, -14)
  point P54 (8.25, -13)
  point P55 (14, -5.1)
  dimension "d1" = 2
  dimension "d2" = 1
  dimension "d3" = 1.5
  dimension "d4" = 1
  dimension "d5" = 1
  dimension "d6" = 1.5
  dimension "d7" = 1.5
  dimension "d8" = 1.5
  dimension "d9" = 8.2
  dimension "d10" = 8.2
  dimension "d11" = 6.8
extrude "Extrude1" add sketch "Sketch1" along normal blind 500
